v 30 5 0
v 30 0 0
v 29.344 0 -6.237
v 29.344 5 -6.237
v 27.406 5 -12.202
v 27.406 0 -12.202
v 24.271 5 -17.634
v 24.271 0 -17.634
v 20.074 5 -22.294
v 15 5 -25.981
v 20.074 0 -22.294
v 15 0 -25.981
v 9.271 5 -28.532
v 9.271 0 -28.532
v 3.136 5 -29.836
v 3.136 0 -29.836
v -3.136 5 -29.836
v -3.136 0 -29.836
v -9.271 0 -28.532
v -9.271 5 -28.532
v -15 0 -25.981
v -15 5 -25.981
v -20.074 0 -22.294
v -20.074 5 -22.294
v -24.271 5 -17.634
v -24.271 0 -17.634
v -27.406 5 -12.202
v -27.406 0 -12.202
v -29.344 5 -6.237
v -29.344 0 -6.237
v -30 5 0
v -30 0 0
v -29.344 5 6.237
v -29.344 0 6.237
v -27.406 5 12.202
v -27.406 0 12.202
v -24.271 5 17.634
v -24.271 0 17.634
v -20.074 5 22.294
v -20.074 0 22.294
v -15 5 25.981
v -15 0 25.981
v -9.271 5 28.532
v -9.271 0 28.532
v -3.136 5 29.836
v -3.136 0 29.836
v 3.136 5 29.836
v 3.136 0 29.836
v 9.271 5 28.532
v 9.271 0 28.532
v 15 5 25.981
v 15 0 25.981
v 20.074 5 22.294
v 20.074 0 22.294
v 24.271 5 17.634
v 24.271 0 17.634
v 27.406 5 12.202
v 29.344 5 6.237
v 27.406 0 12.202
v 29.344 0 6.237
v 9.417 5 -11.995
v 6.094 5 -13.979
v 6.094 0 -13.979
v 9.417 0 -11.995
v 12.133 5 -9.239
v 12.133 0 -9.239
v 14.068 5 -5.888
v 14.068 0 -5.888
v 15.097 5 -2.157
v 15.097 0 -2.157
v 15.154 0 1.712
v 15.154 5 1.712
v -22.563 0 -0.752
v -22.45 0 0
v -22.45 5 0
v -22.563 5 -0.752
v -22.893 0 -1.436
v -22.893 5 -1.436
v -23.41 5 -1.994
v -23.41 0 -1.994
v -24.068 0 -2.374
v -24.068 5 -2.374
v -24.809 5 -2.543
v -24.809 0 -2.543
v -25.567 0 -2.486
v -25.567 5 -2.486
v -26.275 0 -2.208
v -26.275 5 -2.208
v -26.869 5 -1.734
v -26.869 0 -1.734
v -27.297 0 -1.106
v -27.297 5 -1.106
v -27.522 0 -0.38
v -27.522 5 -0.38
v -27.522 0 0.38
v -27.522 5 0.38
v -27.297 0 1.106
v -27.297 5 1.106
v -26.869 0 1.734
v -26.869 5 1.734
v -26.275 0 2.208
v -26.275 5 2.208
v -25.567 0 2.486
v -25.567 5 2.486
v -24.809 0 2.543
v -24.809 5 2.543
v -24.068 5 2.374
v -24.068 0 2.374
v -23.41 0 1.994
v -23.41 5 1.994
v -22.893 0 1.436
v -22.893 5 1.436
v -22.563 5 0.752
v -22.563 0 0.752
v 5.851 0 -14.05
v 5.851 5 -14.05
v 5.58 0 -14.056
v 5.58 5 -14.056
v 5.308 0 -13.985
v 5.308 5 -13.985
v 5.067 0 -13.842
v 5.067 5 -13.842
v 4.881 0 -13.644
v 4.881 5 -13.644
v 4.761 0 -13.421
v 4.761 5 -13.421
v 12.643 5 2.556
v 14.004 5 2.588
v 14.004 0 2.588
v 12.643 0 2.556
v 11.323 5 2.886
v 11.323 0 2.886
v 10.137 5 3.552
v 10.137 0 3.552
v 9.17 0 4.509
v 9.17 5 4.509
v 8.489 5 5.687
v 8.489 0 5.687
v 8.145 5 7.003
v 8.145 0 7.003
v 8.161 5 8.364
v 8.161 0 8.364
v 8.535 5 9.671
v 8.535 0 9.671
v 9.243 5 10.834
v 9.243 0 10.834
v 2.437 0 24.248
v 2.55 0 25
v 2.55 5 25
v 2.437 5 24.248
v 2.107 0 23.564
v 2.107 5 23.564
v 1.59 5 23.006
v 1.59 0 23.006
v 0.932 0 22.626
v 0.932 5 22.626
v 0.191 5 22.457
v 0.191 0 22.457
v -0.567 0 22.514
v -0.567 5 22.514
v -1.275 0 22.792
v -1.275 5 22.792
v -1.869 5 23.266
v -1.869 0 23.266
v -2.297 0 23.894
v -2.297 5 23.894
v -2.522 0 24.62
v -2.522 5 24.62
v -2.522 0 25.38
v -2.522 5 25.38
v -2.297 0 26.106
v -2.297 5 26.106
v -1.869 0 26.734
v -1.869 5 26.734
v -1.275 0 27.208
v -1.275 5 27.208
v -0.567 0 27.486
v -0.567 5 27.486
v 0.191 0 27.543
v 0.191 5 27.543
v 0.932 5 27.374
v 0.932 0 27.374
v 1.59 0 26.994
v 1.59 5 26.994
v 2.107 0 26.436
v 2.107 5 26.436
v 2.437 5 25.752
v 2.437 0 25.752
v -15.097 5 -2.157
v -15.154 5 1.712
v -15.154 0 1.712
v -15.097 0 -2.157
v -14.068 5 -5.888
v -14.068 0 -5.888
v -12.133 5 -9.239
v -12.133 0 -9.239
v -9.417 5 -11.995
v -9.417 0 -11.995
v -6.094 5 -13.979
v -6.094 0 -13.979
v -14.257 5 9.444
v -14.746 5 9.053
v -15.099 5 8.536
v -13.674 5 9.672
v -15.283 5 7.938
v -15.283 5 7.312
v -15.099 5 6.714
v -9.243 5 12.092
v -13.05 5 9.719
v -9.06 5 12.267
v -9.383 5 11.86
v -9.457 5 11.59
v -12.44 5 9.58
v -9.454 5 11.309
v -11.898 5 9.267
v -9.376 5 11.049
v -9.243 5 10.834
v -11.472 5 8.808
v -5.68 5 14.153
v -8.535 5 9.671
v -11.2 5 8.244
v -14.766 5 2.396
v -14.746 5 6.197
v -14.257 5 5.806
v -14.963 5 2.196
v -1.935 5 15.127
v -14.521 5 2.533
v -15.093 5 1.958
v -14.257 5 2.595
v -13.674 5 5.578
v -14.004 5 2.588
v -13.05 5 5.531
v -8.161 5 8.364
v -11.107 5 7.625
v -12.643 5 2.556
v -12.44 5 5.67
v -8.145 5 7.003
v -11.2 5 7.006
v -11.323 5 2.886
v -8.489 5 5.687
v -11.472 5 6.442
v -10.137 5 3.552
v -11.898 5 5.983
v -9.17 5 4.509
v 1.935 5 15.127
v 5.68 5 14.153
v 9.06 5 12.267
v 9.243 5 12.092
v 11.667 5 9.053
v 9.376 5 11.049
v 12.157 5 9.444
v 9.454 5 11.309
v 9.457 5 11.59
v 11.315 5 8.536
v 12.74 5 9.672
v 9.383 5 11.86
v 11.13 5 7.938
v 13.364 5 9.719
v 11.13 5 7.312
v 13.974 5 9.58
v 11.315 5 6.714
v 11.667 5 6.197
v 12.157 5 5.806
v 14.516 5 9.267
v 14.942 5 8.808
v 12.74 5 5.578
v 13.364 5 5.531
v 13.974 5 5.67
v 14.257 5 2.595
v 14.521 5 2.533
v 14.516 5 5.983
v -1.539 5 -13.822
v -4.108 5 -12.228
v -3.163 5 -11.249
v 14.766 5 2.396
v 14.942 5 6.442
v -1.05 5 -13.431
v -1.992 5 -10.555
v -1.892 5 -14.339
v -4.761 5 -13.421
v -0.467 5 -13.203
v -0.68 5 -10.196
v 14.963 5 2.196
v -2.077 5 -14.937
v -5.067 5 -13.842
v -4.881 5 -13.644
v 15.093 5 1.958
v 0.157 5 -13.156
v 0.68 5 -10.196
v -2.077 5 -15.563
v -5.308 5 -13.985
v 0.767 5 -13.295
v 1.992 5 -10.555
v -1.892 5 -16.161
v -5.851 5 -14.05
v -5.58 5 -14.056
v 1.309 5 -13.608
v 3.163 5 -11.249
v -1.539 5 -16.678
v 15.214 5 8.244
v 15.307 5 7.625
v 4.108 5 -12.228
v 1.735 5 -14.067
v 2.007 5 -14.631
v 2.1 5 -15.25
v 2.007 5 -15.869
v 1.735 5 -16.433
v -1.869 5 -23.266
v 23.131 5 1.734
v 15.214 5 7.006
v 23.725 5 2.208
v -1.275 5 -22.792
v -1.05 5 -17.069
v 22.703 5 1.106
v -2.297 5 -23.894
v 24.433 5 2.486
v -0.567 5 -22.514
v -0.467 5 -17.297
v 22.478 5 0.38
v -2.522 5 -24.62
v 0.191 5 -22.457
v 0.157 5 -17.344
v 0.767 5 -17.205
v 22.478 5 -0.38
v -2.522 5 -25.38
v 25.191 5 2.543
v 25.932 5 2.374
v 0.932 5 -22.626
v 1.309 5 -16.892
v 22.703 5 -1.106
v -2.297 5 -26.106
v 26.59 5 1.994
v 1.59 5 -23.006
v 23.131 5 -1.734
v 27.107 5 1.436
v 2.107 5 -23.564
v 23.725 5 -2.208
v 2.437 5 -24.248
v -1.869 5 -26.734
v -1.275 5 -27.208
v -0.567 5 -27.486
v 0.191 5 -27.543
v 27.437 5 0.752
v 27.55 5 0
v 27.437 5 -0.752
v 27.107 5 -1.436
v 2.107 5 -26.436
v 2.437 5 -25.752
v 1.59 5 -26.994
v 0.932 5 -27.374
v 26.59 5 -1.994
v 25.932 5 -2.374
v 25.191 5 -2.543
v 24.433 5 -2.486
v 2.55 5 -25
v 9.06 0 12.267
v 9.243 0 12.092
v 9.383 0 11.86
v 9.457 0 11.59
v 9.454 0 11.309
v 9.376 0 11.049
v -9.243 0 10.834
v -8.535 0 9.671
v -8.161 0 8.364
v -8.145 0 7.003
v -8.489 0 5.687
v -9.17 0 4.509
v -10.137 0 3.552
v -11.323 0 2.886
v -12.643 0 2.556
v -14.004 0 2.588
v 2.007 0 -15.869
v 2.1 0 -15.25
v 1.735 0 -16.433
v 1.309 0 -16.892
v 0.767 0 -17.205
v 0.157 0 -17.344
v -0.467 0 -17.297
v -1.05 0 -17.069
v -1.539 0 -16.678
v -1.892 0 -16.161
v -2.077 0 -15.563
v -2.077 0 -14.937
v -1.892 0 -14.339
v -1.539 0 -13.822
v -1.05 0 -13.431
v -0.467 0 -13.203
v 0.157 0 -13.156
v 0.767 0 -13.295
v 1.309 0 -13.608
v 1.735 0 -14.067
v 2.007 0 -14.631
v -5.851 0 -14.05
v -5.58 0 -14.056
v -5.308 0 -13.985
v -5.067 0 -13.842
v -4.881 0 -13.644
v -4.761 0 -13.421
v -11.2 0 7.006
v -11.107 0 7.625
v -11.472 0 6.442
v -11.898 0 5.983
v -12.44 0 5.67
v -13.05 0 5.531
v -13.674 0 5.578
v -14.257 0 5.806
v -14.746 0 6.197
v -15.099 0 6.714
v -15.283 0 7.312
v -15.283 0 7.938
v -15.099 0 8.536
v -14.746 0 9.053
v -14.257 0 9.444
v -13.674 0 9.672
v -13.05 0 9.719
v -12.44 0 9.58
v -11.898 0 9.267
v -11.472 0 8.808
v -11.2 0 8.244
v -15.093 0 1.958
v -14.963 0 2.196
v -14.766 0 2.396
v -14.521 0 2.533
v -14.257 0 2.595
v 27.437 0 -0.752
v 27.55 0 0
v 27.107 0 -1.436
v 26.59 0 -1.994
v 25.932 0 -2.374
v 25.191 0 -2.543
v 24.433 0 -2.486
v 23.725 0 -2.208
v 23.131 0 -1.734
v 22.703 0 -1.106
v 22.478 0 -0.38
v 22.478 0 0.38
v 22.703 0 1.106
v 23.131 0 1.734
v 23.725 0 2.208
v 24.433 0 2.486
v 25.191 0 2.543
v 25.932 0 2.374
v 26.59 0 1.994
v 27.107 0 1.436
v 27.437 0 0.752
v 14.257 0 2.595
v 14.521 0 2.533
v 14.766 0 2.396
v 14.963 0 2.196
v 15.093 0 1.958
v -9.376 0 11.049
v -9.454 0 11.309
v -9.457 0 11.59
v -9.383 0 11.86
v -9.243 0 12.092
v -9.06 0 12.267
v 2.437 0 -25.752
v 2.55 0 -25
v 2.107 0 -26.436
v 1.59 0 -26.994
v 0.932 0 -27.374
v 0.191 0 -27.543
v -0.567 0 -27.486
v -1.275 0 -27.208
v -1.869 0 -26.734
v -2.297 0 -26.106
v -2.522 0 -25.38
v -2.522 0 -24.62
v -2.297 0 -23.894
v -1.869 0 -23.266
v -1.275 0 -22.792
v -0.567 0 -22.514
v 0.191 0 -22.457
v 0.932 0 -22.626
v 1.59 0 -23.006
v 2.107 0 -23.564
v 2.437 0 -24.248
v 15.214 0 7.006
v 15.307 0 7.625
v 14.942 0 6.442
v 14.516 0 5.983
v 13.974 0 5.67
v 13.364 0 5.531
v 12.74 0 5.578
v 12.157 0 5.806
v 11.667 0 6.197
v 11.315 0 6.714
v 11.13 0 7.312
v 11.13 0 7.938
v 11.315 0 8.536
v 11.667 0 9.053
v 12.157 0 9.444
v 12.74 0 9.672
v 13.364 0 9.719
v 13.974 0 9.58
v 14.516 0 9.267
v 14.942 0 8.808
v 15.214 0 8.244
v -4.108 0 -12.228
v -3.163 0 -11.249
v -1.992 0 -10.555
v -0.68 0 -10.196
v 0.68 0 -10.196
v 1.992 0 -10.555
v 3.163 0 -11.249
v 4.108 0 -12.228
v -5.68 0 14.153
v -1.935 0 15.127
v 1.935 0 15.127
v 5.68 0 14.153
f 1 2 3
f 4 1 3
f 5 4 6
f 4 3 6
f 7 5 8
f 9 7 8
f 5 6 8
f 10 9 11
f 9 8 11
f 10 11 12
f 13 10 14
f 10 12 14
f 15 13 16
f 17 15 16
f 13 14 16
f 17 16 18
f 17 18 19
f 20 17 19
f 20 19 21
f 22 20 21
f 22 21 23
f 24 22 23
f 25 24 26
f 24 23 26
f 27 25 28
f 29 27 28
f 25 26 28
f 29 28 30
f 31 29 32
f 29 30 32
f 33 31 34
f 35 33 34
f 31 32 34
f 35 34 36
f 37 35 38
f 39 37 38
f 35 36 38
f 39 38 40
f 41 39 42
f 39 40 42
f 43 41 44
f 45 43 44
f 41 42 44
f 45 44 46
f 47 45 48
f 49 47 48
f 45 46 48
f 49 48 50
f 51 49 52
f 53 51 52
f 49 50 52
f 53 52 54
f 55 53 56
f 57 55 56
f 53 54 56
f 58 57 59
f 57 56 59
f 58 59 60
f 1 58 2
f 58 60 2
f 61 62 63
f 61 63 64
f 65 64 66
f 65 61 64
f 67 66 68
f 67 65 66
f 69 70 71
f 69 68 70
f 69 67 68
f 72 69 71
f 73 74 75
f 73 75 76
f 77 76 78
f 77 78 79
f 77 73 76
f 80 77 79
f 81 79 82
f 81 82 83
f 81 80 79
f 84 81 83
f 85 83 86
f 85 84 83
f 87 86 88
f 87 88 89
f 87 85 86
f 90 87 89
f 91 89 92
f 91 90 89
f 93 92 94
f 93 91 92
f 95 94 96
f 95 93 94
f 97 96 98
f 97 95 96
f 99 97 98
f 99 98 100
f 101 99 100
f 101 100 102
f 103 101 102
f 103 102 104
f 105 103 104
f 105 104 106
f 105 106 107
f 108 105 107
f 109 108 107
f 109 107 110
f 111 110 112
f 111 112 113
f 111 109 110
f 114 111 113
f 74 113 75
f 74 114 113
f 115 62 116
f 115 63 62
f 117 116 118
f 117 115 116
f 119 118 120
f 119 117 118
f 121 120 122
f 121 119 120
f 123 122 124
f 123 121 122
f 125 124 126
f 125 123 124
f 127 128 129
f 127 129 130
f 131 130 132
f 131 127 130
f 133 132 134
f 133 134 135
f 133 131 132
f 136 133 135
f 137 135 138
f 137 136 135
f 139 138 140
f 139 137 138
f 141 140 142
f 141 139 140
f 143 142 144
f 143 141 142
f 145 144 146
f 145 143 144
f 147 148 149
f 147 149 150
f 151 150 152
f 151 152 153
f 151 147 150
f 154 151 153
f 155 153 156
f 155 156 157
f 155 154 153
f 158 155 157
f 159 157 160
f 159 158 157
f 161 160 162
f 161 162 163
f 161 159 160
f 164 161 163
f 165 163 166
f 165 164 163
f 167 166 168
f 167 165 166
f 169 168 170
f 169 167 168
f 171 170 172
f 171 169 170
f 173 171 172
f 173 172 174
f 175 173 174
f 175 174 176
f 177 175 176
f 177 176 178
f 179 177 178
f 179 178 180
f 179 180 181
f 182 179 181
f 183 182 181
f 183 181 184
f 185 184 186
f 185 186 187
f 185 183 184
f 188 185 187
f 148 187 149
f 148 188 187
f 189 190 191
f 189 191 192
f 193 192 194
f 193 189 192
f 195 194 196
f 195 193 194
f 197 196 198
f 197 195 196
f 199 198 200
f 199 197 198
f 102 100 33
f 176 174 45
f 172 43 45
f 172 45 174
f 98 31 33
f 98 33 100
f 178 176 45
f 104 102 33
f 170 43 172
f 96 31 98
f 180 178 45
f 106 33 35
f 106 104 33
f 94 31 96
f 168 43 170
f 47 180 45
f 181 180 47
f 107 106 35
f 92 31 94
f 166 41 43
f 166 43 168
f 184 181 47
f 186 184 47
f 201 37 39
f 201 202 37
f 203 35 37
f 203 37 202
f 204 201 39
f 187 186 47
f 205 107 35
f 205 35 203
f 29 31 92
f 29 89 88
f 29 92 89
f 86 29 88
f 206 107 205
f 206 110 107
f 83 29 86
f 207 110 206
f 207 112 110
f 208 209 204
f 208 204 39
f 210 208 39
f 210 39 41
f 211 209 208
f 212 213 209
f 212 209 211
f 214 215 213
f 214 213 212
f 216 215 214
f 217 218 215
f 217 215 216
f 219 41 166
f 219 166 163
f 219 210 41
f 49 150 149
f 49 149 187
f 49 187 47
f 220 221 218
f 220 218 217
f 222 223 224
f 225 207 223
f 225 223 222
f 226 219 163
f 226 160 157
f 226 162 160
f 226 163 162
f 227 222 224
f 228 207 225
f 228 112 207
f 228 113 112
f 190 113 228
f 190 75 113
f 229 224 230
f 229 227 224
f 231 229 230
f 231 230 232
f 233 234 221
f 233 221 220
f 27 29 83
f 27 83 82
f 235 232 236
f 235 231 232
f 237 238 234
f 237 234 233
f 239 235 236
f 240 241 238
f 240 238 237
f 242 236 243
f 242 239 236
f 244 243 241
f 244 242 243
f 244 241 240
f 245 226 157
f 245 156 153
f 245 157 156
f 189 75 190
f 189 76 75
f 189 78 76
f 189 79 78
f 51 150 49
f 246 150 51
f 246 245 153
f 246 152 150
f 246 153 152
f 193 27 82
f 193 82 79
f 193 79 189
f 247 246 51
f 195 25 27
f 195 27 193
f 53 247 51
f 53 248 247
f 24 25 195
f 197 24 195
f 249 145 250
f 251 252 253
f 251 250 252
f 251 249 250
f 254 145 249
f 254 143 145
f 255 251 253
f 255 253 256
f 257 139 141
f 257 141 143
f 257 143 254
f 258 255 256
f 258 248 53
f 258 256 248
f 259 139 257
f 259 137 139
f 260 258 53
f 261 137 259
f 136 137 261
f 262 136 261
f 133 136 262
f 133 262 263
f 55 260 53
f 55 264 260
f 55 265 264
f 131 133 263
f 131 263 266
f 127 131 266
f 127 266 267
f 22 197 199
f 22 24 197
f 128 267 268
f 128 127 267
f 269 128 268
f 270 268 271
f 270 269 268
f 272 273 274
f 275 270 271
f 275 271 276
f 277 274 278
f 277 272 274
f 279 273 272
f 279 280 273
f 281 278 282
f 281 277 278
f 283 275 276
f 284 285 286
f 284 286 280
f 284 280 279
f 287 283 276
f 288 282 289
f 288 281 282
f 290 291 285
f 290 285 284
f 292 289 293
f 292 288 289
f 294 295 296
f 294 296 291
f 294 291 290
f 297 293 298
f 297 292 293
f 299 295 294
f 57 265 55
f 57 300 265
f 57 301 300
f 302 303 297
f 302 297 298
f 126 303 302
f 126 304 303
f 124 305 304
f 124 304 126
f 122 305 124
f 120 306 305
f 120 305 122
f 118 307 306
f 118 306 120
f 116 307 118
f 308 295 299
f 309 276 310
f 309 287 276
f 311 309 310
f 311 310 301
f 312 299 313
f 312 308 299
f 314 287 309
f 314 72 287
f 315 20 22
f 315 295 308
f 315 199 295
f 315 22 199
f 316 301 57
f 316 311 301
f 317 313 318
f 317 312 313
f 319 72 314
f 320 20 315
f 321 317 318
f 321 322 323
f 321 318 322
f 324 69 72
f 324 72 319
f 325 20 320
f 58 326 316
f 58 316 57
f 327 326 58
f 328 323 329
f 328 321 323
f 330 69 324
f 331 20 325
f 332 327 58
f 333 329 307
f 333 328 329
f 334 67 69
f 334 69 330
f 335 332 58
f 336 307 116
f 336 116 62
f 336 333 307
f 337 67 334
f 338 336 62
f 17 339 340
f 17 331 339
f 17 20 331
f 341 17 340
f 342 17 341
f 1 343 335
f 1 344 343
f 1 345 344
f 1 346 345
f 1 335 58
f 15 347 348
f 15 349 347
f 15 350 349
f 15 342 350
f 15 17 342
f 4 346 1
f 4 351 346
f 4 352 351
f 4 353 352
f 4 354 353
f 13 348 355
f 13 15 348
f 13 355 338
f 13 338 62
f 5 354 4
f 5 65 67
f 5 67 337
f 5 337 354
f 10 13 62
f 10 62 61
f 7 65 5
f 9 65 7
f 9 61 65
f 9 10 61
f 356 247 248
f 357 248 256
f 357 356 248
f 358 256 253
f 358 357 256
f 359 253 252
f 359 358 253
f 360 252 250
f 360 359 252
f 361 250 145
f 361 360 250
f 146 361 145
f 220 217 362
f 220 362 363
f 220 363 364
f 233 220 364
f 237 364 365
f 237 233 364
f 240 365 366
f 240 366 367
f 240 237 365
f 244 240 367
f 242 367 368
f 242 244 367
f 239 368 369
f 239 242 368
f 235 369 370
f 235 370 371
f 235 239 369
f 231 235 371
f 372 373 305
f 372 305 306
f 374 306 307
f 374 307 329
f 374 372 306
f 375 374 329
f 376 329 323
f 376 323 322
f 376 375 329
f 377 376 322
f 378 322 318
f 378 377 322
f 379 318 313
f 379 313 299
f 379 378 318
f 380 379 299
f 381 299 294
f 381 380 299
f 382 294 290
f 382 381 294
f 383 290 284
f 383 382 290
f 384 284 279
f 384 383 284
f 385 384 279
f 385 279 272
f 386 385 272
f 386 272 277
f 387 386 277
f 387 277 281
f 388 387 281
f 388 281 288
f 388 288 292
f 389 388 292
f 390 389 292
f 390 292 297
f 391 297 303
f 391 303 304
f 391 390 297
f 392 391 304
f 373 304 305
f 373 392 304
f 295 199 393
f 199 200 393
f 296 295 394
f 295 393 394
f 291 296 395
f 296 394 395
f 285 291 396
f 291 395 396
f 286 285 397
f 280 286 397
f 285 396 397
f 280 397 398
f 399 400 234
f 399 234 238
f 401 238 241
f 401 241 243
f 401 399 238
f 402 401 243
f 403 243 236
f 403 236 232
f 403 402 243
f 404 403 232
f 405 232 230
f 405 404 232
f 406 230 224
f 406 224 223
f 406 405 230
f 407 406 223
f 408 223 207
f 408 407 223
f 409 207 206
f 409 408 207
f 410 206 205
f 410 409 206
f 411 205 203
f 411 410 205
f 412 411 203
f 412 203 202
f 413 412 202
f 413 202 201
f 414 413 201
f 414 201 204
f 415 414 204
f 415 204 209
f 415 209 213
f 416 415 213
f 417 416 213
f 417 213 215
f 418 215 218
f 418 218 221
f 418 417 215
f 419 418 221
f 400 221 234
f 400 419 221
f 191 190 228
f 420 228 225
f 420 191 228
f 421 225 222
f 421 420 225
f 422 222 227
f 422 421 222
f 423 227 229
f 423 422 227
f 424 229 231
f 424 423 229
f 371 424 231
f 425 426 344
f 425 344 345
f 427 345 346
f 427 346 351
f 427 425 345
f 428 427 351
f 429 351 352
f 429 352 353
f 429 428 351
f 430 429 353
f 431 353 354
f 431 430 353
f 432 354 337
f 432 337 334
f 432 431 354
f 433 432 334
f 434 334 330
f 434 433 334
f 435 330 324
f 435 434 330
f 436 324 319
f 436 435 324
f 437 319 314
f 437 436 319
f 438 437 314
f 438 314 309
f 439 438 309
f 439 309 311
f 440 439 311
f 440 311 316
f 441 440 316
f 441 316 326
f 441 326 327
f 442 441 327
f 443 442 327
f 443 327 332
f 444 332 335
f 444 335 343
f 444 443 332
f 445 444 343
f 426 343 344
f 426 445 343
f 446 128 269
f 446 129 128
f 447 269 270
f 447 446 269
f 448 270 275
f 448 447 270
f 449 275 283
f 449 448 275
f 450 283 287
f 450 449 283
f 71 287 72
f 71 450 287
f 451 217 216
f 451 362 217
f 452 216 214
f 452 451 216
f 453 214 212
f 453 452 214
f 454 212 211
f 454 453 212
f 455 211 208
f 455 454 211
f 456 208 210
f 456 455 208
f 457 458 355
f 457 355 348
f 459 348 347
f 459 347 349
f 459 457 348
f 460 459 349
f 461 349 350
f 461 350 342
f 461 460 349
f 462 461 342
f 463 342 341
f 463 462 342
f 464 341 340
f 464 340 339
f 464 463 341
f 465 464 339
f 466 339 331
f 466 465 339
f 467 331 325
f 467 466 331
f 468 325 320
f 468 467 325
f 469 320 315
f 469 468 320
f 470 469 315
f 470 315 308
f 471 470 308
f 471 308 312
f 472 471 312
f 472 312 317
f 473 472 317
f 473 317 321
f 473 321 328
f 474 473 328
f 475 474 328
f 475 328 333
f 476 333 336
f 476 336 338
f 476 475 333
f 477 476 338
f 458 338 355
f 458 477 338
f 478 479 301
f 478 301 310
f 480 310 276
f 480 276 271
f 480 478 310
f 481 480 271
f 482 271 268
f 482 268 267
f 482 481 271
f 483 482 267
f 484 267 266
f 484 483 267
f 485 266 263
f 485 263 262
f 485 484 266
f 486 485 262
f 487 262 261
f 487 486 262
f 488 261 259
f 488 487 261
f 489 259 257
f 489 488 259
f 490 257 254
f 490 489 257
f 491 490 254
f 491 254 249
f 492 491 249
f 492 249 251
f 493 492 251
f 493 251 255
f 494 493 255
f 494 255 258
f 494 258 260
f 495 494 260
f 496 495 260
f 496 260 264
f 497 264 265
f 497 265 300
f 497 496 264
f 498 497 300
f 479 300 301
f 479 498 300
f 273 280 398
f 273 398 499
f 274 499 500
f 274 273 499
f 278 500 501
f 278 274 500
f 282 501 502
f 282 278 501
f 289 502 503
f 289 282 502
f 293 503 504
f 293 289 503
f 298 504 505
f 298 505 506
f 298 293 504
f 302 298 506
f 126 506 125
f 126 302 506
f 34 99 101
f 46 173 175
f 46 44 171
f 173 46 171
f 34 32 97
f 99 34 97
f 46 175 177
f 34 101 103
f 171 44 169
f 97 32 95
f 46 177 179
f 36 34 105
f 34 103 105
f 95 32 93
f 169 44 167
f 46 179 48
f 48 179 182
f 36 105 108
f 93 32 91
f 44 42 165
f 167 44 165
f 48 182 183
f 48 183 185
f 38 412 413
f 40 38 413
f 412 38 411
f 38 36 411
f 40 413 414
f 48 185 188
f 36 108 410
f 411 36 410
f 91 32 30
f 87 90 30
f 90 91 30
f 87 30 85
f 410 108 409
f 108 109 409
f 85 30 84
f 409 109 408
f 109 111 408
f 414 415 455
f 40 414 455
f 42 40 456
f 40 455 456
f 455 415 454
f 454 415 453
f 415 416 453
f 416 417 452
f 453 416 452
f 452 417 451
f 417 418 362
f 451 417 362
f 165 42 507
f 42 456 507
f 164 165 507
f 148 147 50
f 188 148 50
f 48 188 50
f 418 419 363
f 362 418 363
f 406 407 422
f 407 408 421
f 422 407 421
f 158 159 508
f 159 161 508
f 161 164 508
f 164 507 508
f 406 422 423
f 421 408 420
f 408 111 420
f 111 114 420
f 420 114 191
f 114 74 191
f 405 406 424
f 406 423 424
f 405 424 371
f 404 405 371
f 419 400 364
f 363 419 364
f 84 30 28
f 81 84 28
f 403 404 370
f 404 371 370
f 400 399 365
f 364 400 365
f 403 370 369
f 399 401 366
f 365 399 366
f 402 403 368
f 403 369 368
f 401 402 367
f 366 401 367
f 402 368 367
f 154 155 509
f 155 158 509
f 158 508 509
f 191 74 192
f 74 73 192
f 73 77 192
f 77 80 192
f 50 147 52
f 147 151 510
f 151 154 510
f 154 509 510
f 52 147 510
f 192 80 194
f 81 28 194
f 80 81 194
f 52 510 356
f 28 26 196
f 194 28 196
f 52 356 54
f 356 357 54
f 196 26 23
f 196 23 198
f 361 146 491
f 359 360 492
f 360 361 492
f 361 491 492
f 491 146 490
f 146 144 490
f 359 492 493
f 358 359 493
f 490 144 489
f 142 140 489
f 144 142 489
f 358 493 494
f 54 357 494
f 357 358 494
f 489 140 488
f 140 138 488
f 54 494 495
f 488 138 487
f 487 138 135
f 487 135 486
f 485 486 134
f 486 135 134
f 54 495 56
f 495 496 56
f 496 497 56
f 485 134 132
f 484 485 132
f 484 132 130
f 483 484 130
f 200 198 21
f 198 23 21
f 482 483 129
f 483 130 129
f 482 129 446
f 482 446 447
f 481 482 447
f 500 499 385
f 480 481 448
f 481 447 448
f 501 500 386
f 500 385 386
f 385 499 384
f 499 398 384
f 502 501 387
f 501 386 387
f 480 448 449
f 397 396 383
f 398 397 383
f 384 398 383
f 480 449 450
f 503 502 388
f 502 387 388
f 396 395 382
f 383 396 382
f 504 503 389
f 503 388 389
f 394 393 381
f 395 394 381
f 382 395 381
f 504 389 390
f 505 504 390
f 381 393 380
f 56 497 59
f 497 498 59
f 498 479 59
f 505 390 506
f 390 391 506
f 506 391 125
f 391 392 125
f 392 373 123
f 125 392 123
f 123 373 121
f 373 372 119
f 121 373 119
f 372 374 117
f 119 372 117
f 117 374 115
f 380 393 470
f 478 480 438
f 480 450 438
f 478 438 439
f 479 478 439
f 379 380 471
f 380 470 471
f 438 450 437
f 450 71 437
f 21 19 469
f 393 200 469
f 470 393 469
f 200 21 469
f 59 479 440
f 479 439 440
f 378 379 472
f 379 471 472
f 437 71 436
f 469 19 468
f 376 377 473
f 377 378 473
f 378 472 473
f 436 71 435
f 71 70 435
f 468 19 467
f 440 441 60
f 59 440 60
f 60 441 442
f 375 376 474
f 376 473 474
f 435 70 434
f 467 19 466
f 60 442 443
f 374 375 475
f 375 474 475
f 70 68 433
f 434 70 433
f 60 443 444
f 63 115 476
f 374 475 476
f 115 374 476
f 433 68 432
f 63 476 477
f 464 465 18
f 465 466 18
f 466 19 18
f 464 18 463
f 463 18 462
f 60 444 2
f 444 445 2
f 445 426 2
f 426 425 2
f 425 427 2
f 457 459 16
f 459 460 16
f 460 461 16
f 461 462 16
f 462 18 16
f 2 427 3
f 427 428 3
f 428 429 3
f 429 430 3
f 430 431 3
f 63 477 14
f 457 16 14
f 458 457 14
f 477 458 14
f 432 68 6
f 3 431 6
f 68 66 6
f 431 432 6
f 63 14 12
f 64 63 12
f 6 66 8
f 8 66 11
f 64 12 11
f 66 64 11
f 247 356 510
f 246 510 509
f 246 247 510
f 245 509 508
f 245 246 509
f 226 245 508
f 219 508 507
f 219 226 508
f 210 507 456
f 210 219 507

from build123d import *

# Parameters (mm, degrees)
SKETCH1_R           = 30
SKETCH1_R_2         = 10
SKETCH1_R_3         = 2.1
SKETCH1_R_4         = 2.55
BOSS_EXTRUDE1_DEPTH = 5
CUT_EXTRUDE1_DEPTH  = 6
FILLET1_R           = 1


with BuildPart() as part:
    # Sketch1 → Boss-Extrude1 (new body)
    with BuildSketch(Plane(origin=(0, 0, 0), x_dir=(1, 0, 0), z_dir=(0, 1, 0))):
        Circle(SKETCH1_R)
        Circle(SKETCH1_R_2, mode=Mode.SUBTRACT)
        with Locations((0, 15.25)):
            Circle(SKETCH1_R_3, mode=Mode.SUBTRACT)
        with Locations((13.206887408, -7.625)):
            Circle(SKETCH1_R_3, mode=Mode.SUBTRACT)
        with Locations((-13.206887408, -7.625)):
            Circle(SKETCH1_R_3, mode=Mode.SUBTRACT)
        with Locations((0, 25)):
            Circle(SKETCH1_R_4, mode=Mode.SUBTRACT)
        with Locations((25, 0)):
            Circle(SKETCH1_R_4, mode=Mode.SUBTRACT)
        with Locations((0, -25)):
            Circle(SKETCH1_R_4, mode=Mode.SUBTRACT)
        with Locations((-25, 0)):
            Circle(SKETCH1_R_4, mode=Mode.SUBTRACT)
    extrude(amount=BOSS_EXTRUDE1_DEPTH)

    # Sketch2 → Cut-Extrude1 (cut, through all)
    with BuildSketch(Plane(origin=(0, 5, 0), x_dir=(1, 0, 0), z_dir=(0, 1, 0))):
        with BuildLine():
            ThreePointArc((-5.028195952, 14.397213115), (0, 10.15), (5.028195952, 14.397213115))
            ThreePointArc((5.028195952, 14.397213115), (13.206887408, 7.625), (14.982450277, -2.844061128))
            ThreePointArc((14.982450277, -2.844061128), (8.790157848, -5.075), (9.954254325, -11.553151987))
            ThreePointArc((9.954254325, -11.553151987), (0, -15.25), (-9.954254325, -11.553151987))
            ThreePointArc((-9.954254325, -11.553151987), (-8.790157848, -5.075), (-14.982450277, -2.844061128))
            ThreePointArc((-14.982450277, -2.844061128), (-13.206887408, 7.625), (-5.028195952, 14.397213115))
        make_face()
    extrude(amount=-CUT_EXTRUDE1_DEPTH, mode=Mode.SUBTRACT)

    # Fillet1
    fillet1_edges = [part.edges().sort_by_distance(p)[0] for p in [
        (-14.982450277, 2.5, 2.844061128),
        (-5.028195952, 2.5, -14.397213115),
        (5.028195952, 2.5, -14.397213115),
        (14.982450277, 2.5, 2.844061128),
        (9.954254325, 2.5, 11.553151987),
        (-9.954254325, 2.5, 11.553151987),
    ]]
    fillet(fillet1_edges, radius=FILLET1_R)


solid = part.part
